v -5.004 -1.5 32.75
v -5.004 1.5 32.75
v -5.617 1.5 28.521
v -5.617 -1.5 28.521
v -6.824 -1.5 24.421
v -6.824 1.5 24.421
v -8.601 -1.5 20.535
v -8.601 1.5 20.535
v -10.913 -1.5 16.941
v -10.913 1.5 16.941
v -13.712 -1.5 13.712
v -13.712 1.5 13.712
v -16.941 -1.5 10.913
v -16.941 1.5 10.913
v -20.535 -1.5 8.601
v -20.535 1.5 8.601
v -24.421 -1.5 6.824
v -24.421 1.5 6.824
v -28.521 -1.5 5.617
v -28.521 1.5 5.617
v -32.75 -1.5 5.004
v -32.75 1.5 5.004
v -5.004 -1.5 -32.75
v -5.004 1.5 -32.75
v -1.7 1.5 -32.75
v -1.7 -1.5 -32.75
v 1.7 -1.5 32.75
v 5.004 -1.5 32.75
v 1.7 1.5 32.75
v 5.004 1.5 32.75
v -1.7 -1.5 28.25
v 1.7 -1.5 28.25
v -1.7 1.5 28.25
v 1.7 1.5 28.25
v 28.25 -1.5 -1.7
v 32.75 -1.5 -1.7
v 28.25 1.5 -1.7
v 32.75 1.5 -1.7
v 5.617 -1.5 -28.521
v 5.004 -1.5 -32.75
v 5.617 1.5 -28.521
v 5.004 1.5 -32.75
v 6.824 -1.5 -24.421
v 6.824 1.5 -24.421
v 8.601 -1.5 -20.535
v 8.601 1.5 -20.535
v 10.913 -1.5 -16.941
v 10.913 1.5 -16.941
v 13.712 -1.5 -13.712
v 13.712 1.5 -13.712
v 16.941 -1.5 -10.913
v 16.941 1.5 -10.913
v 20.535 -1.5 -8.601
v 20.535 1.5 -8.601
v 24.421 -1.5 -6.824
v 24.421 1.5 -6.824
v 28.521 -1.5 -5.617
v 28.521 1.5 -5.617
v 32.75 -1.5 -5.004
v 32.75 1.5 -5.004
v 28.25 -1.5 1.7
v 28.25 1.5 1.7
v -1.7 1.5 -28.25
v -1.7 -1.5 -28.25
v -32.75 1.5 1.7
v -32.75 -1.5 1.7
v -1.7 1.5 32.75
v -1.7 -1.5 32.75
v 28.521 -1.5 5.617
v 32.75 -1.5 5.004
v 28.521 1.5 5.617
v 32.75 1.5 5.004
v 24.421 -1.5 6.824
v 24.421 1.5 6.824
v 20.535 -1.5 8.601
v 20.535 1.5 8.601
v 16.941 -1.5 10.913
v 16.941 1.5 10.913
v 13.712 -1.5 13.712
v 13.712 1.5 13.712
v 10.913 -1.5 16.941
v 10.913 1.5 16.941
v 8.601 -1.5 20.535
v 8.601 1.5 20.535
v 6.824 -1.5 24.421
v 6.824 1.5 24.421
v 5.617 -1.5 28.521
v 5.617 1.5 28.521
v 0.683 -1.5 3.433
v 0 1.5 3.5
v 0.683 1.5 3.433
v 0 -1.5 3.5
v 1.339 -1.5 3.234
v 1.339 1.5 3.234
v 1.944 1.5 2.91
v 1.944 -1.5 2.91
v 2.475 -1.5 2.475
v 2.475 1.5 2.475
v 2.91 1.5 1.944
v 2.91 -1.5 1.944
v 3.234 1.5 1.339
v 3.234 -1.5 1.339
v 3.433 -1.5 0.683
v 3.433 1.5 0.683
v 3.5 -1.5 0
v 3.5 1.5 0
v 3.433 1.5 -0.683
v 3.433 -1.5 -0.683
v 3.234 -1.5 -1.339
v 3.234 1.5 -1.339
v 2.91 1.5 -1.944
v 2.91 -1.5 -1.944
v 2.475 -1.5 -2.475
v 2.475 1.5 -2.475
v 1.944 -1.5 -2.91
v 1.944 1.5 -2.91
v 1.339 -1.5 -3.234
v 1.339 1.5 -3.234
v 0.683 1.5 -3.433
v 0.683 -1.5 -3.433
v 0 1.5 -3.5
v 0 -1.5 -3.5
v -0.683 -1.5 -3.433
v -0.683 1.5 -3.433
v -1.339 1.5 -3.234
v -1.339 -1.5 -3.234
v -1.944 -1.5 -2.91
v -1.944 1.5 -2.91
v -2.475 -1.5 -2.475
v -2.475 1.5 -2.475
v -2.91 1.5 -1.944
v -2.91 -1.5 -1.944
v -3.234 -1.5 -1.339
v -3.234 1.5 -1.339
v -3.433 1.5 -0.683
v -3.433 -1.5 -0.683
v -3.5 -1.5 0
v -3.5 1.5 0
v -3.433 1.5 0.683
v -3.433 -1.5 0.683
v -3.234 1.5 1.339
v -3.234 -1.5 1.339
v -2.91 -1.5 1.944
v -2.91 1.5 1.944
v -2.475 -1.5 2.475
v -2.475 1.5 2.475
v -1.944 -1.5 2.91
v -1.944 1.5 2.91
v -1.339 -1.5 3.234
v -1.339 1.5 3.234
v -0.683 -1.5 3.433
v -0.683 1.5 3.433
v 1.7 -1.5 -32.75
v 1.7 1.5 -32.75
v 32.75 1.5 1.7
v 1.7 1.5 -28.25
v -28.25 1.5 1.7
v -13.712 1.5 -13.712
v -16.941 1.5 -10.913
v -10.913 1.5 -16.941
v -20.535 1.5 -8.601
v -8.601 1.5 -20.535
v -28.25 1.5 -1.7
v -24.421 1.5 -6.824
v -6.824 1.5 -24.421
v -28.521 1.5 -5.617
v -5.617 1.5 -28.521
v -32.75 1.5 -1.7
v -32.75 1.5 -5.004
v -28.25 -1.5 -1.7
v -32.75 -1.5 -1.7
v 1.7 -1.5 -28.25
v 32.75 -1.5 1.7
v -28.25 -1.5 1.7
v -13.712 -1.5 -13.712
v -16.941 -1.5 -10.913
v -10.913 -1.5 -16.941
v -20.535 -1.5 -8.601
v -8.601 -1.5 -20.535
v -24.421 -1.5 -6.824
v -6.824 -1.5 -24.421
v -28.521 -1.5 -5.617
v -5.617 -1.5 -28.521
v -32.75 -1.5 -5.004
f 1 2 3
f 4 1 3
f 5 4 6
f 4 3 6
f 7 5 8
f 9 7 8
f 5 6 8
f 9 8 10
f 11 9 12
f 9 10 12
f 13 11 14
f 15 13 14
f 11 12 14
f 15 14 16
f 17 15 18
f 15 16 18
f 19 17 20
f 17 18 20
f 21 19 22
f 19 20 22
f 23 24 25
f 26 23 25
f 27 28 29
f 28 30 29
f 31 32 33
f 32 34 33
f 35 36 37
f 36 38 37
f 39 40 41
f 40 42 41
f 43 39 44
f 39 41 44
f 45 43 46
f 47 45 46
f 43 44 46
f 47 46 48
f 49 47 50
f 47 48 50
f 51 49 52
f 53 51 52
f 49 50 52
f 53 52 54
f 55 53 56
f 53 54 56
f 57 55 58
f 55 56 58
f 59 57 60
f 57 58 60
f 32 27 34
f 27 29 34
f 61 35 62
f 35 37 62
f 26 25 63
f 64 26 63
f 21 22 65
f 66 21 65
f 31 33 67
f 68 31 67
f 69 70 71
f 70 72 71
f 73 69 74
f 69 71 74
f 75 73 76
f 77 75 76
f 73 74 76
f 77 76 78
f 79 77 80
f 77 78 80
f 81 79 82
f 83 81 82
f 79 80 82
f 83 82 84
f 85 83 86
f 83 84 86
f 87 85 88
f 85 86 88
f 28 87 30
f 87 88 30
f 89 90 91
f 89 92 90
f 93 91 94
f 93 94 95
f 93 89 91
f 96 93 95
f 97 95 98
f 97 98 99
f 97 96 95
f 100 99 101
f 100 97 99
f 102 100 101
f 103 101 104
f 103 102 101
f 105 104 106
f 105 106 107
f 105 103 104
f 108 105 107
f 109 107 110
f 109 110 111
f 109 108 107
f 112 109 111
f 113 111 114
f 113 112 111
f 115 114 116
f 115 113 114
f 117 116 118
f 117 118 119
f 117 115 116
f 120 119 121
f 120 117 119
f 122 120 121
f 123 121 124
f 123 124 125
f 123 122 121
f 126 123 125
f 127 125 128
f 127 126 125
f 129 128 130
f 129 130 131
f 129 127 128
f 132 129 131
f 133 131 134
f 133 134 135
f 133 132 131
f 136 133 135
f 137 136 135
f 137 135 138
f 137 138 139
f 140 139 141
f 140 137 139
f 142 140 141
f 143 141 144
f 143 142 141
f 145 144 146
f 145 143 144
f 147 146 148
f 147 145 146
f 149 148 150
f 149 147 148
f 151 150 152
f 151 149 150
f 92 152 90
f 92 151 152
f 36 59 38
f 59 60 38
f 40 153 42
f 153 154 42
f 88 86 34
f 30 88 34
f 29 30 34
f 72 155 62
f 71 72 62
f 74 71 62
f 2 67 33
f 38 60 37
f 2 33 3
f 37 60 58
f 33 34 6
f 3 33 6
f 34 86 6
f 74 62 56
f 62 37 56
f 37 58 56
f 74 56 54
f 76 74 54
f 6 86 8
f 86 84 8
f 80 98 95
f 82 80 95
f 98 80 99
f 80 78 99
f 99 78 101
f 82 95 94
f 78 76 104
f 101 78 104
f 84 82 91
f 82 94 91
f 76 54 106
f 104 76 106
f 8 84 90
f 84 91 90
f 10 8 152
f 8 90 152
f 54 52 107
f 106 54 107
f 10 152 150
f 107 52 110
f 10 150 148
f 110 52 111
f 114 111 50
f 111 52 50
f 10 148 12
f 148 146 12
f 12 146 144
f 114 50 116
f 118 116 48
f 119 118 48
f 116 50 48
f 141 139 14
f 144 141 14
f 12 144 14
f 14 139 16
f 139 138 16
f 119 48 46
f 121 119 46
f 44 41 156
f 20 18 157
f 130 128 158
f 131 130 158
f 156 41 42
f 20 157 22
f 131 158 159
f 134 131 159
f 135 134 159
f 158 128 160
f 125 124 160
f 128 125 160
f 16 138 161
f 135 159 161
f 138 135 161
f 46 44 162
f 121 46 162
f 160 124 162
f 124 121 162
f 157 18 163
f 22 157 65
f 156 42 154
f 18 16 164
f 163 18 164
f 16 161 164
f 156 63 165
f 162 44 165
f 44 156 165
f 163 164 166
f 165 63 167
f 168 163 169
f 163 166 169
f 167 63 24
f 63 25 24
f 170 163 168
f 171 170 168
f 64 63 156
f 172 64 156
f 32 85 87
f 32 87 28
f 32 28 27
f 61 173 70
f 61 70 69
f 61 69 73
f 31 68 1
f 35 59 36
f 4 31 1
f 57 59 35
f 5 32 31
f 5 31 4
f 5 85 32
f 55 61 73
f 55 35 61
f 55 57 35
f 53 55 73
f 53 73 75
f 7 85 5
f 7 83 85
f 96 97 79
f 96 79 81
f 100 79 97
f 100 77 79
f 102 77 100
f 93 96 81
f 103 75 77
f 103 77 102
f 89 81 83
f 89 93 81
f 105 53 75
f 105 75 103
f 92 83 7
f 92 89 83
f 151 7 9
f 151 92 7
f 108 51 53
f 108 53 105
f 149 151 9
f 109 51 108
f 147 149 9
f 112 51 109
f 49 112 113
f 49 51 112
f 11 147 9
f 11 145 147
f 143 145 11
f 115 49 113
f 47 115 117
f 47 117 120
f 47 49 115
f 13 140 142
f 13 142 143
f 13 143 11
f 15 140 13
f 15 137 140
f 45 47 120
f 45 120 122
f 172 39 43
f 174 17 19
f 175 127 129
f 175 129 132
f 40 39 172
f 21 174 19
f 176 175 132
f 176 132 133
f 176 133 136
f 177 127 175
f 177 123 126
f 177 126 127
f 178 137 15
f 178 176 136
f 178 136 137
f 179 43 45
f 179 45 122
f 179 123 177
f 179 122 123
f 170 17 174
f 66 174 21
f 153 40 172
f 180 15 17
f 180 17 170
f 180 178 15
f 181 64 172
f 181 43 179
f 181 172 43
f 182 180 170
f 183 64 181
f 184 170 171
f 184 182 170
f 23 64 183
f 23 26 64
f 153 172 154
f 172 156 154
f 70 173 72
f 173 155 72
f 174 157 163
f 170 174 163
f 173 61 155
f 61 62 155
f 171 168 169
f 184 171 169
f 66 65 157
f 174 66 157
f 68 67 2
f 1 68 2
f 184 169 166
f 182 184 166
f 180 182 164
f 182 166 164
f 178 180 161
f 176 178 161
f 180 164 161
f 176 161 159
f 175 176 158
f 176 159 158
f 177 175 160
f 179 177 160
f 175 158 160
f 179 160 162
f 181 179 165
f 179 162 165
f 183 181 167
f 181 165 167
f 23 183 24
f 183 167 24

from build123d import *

# Parameters (mm, degrees)
SKETCH1_R           = 3.5
BOSS_EXTRUDE1_DEPTH = 1.5


with BuildPart() as part:
    # Sketch1 → Boss-Extrude1 (new, symmetric)
    with BuildSketch(Plane(origin=(0, 0, 0), x_dir=(1, 0, 0), z_dir=(0, 1, 0))):
        with BuildLine():
            Line((-1.7, 28.25), (1.7, 28.25))
            Line((1.7, 28.25), (1.7, 32.75))
            Line((1.7, 32.75), (5.003947629, 32.75))
            ThreePointArc((5.003947629, 32.75), (13.711796564, 13.711796564), (32.75, 5.003947629))
            Line((32.75, 5.003947629), (32.75, 1.7))
            Line((32.75, 1.7), (28.25, 1.7))
            Line((28.25, 1.7), (28.25, -1.7))
            Line((28.25, -1.7), (32.75, -1.7))
            Line((32.75, -1.7), (32.75, -5.003947629))
            ThreePointArc((32.75, -5.003947629), (13.711796564, -13.711796564), (5.003947629, -32.75))
            Line((5.003947629, -32.75), (1.7, -32.75))
            Line((1.7, -32.75), (1.7, -28.25))
            Line((1.7, -28.25), (-1.7, -28.25))
            Line((-1.7, -28.25), (-1.7, -32.75))
            Line((-1.7, -32.75), (-5.003947629, -32.75))
            ThreePointArc((-5.003947629, -32.75), (-13.711796564, -13.711796564), (-32.75, -5.003947629))
            Line((-32.75, -5.003947629), (-32.75, -1.7))
            Line((-32.75, -1.7), (-28.25, -1.7))
            Line((-28.25, -1.7), (-28.25, 1.7))
            Line((-28.25, 1.7), (-32.75, 1.7))
            Line((-32.75, 1.7), (-32.75, 5.003947629))
            ThreePointArc((-32.75, 5.003947629), (-13.711796564, 13.711796564), (-5.003947629, 32.75))
            Line((-5.003947629, 32.75), (-1.7, 32.75))
            Line((-1.7, 32.75), (-1.7, 28.25))
        make_face()
        with Locations(Location((0, 0, 0), (0, 0, 270))):
            Circle(SKETCH1_R, mode=Mode.SUBTRACT)
    extrude(amount=BOSS_EXTRUDE1_DEPTH, both=True)


solid = part.part
